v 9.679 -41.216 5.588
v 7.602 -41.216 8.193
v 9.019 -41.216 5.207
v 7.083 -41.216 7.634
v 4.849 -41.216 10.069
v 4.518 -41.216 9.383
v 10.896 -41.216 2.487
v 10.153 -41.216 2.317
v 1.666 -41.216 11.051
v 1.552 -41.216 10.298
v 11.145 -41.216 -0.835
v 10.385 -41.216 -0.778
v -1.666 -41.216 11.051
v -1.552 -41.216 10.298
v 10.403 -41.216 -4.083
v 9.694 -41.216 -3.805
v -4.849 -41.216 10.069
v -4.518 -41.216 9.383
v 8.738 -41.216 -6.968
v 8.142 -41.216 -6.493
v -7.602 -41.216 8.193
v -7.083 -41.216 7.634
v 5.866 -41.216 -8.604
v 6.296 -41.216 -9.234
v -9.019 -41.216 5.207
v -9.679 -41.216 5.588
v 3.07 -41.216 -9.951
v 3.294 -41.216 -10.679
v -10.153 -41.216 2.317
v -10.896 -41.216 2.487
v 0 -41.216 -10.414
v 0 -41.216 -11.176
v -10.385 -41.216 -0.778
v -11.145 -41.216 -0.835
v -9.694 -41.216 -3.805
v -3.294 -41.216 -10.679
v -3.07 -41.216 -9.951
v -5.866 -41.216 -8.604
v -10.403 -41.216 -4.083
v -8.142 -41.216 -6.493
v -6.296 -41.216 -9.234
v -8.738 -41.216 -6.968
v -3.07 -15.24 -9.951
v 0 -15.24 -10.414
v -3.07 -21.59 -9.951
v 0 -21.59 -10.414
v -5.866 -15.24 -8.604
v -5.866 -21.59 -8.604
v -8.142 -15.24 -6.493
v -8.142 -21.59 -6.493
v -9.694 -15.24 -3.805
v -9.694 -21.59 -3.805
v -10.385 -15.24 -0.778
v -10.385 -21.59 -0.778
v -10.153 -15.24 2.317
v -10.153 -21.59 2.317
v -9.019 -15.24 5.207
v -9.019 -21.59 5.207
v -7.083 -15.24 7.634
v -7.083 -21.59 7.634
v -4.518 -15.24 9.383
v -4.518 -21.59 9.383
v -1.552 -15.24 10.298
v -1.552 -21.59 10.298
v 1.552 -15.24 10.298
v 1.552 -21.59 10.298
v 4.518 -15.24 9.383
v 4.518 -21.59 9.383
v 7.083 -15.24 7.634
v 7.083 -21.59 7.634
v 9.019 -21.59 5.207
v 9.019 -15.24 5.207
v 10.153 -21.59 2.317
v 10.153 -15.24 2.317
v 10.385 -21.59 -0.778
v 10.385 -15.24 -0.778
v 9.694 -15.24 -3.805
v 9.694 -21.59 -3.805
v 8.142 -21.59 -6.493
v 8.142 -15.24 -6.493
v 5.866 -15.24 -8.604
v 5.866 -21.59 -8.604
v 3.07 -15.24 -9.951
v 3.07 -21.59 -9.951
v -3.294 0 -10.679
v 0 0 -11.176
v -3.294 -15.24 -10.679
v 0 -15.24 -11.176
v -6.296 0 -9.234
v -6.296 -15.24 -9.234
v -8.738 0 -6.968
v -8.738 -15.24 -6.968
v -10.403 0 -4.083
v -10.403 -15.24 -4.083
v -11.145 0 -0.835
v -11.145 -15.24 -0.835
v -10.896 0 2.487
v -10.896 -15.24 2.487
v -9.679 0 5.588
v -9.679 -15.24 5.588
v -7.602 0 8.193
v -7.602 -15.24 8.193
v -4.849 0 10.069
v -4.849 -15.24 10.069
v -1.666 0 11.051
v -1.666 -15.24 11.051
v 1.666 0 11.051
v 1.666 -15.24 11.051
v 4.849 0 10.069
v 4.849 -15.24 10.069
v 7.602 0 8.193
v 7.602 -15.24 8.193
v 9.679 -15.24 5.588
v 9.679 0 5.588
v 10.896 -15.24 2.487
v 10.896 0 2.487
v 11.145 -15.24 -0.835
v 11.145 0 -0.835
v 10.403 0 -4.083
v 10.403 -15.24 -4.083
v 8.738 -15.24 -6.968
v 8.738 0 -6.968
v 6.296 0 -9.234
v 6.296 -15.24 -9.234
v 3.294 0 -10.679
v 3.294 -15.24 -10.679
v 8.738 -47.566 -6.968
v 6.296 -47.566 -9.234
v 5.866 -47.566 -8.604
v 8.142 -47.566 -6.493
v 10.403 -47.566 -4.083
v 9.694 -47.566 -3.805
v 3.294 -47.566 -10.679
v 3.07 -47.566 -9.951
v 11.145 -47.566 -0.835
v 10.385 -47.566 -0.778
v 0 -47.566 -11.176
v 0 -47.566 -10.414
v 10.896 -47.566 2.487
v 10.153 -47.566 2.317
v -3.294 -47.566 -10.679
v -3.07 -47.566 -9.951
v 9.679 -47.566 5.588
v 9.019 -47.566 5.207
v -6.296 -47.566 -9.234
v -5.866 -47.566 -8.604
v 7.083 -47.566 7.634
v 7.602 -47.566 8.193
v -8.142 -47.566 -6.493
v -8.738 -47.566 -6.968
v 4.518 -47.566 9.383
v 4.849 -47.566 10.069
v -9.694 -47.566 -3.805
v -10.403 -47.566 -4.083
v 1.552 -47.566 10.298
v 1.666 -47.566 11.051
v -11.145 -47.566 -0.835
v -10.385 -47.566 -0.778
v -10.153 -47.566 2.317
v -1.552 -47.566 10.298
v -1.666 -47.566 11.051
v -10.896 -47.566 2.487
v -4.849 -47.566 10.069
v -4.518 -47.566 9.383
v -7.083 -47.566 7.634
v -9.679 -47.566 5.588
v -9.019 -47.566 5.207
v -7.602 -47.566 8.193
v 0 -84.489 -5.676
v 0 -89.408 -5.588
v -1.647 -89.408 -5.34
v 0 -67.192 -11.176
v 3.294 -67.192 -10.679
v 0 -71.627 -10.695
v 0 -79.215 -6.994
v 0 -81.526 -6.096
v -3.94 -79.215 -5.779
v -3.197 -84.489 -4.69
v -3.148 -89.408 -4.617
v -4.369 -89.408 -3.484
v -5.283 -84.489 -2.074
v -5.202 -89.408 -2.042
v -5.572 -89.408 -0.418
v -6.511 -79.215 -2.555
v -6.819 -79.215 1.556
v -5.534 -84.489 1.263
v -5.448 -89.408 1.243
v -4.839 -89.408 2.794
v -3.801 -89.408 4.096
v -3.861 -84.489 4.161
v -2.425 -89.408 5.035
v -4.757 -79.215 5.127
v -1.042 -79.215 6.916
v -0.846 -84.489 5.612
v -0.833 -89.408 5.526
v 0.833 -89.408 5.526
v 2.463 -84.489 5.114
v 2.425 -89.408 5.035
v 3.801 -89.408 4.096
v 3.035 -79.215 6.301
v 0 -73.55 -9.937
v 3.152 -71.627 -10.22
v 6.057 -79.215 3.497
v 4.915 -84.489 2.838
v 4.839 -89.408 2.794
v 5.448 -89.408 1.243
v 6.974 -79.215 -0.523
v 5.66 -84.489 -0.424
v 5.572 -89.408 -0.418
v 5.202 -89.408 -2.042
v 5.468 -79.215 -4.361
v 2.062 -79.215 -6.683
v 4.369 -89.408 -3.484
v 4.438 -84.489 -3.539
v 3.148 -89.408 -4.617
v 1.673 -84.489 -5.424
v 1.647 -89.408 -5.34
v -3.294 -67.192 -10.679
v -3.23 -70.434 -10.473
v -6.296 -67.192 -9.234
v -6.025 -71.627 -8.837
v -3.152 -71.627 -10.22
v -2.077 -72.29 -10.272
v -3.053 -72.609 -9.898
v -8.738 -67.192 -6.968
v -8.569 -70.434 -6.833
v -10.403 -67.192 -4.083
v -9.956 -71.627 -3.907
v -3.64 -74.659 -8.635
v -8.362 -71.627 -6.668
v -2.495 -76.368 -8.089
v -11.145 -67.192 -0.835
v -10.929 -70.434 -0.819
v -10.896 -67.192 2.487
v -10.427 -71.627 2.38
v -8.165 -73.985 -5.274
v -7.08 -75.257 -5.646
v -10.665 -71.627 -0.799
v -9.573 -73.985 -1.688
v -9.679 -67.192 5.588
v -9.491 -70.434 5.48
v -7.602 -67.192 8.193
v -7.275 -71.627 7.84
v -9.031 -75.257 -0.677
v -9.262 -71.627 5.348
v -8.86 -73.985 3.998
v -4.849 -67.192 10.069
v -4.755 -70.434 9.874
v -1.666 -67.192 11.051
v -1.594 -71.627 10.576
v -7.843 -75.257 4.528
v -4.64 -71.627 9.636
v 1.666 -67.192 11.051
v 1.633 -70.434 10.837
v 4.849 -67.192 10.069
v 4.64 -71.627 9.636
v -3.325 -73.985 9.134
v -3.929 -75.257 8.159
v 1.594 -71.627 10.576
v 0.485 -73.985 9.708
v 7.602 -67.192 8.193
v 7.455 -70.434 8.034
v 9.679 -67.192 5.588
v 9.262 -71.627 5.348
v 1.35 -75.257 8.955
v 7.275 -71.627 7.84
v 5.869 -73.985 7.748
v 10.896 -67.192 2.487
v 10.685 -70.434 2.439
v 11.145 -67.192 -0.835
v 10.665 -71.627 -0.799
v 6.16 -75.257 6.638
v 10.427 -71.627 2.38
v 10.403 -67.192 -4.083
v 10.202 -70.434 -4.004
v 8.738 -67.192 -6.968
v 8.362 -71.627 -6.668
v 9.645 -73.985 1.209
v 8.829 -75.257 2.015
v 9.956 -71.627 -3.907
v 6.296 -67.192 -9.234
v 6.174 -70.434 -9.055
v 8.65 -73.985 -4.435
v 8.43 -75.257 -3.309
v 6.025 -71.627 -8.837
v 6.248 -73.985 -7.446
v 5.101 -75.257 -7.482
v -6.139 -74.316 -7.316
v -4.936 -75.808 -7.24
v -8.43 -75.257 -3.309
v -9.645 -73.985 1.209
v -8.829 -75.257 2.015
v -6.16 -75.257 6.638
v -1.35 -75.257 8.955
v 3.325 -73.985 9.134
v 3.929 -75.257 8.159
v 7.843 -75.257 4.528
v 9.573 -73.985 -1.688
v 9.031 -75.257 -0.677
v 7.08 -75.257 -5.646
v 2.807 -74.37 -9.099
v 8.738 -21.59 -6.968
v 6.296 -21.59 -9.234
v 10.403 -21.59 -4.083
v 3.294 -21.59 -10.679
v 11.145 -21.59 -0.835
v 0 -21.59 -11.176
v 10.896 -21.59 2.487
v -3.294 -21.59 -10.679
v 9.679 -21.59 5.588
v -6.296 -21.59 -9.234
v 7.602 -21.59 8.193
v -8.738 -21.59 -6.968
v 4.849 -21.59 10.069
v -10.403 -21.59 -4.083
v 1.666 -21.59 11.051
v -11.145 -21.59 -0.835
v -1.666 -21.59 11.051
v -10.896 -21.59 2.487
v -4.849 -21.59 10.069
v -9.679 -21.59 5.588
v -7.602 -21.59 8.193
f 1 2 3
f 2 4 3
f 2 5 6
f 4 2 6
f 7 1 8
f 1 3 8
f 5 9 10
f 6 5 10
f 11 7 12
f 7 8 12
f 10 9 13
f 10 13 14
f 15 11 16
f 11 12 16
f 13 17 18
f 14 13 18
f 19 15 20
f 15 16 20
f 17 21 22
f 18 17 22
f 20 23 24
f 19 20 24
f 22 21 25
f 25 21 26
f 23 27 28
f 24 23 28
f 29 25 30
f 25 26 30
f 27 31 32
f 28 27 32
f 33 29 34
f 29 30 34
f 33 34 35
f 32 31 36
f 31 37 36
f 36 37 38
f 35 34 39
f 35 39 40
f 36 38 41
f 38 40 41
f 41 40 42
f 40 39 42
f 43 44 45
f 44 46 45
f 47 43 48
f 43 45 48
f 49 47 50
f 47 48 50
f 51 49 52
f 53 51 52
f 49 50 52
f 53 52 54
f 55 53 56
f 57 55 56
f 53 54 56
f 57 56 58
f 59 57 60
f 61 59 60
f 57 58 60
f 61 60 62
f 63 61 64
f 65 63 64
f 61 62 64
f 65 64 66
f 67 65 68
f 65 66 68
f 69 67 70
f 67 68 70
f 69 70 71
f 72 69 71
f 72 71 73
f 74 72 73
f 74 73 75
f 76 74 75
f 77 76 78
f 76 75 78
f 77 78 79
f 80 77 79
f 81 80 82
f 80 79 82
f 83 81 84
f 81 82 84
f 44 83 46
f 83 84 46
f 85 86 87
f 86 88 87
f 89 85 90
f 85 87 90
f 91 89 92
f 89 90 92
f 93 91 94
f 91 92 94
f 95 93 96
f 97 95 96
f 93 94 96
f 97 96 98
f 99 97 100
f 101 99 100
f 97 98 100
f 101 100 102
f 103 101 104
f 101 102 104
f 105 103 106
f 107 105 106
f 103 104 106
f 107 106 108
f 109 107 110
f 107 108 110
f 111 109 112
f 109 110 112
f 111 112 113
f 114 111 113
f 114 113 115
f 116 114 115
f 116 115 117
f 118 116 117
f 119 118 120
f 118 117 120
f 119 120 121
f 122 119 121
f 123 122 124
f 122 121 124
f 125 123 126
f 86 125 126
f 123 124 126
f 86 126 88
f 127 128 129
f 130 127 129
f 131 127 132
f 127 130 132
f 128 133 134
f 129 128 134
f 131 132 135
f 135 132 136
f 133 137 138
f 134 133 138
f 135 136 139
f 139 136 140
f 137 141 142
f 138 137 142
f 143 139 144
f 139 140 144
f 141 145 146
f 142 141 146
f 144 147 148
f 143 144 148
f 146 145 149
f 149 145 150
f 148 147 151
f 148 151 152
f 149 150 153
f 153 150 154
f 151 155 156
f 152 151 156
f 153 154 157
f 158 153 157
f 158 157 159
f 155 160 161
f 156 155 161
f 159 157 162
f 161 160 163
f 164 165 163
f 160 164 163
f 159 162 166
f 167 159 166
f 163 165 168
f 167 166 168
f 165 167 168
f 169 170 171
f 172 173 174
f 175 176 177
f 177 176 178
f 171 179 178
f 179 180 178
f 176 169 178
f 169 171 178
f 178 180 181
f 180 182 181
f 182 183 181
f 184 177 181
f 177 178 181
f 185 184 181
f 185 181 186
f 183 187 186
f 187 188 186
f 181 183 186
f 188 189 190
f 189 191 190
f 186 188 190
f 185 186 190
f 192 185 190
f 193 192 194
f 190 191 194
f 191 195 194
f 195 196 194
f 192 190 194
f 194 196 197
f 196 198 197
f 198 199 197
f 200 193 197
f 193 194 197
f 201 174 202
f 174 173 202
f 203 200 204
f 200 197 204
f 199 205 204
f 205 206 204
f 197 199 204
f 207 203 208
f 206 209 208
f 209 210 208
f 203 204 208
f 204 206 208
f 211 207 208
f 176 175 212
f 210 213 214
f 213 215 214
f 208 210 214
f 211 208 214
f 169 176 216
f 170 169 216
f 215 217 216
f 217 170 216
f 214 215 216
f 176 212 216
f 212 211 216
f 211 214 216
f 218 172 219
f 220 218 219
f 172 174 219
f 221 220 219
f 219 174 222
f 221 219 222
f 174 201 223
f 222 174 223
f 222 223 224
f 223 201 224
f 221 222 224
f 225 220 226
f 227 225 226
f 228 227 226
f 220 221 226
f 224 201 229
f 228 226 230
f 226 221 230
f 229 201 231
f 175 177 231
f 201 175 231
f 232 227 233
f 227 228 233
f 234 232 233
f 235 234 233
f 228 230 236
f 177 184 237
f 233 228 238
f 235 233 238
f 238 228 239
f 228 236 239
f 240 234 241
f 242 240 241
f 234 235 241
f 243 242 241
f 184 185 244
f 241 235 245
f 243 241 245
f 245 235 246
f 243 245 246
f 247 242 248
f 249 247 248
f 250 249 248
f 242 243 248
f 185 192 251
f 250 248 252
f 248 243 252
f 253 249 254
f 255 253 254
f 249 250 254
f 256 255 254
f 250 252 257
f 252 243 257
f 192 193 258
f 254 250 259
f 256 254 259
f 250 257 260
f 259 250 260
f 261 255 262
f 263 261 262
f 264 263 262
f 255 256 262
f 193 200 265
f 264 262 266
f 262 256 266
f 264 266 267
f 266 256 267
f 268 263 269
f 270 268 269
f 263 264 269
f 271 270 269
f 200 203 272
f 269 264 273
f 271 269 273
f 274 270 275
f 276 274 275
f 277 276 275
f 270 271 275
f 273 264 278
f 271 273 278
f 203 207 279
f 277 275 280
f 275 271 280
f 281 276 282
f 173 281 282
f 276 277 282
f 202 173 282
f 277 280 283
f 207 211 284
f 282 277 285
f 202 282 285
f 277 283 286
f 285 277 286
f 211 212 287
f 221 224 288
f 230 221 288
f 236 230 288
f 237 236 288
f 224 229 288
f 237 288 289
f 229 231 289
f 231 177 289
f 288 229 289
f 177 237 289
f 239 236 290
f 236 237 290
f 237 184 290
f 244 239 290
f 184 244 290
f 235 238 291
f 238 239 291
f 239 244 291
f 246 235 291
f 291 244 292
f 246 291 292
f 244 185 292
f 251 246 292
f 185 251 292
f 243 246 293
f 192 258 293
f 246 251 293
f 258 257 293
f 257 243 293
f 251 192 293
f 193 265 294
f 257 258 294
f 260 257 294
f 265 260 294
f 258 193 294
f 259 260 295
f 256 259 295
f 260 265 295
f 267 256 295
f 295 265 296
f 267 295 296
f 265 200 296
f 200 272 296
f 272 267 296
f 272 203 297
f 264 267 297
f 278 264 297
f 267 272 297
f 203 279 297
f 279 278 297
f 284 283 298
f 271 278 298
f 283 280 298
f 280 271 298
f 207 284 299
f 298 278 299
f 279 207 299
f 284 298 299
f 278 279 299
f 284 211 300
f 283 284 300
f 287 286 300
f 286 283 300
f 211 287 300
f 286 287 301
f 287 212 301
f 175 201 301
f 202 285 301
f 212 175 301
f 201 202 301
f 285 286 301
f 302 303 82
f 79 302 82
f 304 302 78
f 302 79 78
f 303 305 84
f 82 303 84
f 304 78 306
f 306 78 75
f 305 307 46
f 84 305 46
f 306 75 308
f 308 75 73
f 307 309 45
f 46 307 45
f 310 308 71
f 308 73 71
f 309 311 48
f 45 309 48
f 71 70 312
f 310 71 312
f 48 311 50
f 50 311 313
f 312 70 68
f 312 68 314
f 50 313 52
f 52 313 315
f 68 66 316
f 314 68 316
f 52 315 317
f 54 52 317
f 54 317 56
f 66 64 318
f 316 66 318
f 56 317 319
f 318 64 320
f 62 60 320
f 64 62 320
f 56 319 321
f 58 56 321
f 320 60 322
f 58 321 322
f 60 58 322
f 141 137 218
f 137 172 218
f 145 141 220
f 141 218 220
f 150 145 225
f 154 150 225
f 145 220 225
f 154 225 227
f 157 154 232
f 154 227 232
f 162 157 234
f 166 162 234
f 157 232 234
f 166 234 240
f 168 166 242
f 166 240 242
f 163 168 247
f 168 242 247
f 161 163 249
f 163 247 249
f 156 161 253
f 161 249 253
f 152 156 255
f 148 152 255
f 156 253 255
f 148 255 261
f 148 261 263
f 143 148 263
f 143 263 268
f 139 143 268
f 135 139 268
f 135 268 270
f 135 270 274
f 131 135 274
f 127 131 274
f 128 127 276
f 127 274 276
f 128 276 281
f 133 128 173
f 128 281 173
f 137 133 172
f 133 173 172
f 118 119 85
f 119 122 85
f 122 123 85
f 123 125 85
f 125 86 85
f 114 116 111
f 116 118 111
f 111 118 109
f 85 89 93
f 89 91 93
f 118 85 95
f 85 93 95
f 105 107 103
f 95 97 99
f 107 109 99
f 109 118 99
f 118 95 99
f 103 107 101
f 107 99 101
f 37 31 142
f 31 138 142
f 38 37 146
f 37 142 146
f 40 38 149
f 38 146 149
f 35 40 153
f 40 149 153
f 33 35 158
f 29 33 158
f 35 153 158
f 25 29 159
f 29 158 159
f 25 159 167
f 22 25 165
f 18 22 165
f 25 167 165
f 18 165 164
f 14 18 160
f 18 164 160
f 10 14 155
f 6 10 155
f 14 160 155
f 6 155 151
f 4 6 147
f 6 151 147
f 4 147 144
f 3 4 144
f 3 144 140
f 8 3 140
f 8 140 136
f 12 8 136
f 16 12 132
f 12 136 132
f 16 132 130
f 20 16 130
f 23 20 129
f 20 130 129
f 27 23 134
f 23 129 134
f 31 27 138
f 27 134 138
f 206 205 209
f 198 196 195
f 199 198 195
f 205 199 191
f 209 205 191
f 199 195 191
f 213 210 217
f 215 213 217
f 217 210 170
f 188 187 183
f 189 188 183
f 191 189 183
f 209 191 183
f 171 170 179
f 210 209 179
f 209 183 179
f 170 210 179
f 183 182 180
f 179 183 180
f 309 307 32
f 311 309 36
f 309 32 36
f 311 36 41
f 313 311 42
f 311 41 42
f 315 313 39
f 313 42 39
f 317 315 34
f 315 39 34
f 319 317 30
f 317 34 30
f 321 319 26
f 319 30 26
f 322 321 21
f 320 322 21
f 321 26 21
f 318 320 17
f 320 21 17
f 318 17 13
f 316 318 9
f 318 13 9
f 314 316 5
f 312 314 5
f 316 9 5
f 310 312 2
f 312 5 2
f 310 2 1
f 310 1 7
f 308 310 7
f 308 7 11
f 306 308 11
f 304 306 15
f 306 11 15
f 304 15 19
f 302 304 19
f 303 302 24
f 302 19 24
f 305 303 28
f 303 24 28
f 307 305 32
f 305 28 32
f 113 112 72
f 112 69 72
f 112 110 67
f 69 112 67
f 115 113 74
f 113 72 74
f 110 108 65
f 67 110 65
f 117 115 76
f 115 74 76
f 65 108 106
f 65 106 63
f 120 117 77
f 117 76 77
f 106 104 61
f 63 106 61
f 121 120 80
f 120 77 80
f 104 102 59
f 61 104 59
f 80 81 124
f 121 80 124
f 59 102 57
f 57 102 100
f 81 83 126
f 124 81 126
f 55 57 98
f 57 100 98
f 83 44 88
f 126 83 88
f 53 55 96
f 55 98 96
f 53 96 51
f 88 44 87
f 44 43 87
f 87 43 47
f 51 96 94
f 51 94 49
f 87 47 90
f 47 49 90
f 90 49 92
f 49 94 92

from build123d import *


with BuildPart() as part:
    # Sketch1 → Revolve1 (revolve)
    with BuildSketch(Plane.XY, mode=Mode.PRIVATE) as revolve1_sk:
        with BuildLine():
            Line((0, 0), (11.176, 0))
            Line((11.176, 0), (11.176, -15.24))
            Line((11.176, -15.24), (10.414, -15.24))
            Line((10.414, -15.24), (10.414, -21.59))
            Line((10.414, -21.59), (11.176, -21.59))
            Line((11.176, -21.59), (11.176, -41.215894229))
            Line((11.176, -41.215894229), (10.414, -41.215894229))
            Line((10.414, -41.215894229), (10.414, -47.565894229))
            Line((10.414, -47.565894229), (11.176, -47.565894229))
            Line((11.176, -47.565894229), (11.176, -67.191788457))
            add(Edge.make_bspline(
                [(11.176, -67.191788457), (11.176, -70.951410921), (10.182939744, -73.257982378), (5.810891639, -81.176539717), (5.588, -82.94585867), (5.588, -89.408)],
                knots=[0, 0, 0, 0, 0.316449847, 0.542190509, 1, 1, 1, 1], degree=3))
            Line((5.588, -89.408), (0, -89.408))
            Line((0, -89.408), (0, 0))
        make_face()
    revolve(revolve1_sk.sketch.rotate(Axis((0, -89.408, 0), (0, 1, 0)), 90), axis=Axis((0, -89.408, 0), (0, 1, 0)))


solid = part.part
